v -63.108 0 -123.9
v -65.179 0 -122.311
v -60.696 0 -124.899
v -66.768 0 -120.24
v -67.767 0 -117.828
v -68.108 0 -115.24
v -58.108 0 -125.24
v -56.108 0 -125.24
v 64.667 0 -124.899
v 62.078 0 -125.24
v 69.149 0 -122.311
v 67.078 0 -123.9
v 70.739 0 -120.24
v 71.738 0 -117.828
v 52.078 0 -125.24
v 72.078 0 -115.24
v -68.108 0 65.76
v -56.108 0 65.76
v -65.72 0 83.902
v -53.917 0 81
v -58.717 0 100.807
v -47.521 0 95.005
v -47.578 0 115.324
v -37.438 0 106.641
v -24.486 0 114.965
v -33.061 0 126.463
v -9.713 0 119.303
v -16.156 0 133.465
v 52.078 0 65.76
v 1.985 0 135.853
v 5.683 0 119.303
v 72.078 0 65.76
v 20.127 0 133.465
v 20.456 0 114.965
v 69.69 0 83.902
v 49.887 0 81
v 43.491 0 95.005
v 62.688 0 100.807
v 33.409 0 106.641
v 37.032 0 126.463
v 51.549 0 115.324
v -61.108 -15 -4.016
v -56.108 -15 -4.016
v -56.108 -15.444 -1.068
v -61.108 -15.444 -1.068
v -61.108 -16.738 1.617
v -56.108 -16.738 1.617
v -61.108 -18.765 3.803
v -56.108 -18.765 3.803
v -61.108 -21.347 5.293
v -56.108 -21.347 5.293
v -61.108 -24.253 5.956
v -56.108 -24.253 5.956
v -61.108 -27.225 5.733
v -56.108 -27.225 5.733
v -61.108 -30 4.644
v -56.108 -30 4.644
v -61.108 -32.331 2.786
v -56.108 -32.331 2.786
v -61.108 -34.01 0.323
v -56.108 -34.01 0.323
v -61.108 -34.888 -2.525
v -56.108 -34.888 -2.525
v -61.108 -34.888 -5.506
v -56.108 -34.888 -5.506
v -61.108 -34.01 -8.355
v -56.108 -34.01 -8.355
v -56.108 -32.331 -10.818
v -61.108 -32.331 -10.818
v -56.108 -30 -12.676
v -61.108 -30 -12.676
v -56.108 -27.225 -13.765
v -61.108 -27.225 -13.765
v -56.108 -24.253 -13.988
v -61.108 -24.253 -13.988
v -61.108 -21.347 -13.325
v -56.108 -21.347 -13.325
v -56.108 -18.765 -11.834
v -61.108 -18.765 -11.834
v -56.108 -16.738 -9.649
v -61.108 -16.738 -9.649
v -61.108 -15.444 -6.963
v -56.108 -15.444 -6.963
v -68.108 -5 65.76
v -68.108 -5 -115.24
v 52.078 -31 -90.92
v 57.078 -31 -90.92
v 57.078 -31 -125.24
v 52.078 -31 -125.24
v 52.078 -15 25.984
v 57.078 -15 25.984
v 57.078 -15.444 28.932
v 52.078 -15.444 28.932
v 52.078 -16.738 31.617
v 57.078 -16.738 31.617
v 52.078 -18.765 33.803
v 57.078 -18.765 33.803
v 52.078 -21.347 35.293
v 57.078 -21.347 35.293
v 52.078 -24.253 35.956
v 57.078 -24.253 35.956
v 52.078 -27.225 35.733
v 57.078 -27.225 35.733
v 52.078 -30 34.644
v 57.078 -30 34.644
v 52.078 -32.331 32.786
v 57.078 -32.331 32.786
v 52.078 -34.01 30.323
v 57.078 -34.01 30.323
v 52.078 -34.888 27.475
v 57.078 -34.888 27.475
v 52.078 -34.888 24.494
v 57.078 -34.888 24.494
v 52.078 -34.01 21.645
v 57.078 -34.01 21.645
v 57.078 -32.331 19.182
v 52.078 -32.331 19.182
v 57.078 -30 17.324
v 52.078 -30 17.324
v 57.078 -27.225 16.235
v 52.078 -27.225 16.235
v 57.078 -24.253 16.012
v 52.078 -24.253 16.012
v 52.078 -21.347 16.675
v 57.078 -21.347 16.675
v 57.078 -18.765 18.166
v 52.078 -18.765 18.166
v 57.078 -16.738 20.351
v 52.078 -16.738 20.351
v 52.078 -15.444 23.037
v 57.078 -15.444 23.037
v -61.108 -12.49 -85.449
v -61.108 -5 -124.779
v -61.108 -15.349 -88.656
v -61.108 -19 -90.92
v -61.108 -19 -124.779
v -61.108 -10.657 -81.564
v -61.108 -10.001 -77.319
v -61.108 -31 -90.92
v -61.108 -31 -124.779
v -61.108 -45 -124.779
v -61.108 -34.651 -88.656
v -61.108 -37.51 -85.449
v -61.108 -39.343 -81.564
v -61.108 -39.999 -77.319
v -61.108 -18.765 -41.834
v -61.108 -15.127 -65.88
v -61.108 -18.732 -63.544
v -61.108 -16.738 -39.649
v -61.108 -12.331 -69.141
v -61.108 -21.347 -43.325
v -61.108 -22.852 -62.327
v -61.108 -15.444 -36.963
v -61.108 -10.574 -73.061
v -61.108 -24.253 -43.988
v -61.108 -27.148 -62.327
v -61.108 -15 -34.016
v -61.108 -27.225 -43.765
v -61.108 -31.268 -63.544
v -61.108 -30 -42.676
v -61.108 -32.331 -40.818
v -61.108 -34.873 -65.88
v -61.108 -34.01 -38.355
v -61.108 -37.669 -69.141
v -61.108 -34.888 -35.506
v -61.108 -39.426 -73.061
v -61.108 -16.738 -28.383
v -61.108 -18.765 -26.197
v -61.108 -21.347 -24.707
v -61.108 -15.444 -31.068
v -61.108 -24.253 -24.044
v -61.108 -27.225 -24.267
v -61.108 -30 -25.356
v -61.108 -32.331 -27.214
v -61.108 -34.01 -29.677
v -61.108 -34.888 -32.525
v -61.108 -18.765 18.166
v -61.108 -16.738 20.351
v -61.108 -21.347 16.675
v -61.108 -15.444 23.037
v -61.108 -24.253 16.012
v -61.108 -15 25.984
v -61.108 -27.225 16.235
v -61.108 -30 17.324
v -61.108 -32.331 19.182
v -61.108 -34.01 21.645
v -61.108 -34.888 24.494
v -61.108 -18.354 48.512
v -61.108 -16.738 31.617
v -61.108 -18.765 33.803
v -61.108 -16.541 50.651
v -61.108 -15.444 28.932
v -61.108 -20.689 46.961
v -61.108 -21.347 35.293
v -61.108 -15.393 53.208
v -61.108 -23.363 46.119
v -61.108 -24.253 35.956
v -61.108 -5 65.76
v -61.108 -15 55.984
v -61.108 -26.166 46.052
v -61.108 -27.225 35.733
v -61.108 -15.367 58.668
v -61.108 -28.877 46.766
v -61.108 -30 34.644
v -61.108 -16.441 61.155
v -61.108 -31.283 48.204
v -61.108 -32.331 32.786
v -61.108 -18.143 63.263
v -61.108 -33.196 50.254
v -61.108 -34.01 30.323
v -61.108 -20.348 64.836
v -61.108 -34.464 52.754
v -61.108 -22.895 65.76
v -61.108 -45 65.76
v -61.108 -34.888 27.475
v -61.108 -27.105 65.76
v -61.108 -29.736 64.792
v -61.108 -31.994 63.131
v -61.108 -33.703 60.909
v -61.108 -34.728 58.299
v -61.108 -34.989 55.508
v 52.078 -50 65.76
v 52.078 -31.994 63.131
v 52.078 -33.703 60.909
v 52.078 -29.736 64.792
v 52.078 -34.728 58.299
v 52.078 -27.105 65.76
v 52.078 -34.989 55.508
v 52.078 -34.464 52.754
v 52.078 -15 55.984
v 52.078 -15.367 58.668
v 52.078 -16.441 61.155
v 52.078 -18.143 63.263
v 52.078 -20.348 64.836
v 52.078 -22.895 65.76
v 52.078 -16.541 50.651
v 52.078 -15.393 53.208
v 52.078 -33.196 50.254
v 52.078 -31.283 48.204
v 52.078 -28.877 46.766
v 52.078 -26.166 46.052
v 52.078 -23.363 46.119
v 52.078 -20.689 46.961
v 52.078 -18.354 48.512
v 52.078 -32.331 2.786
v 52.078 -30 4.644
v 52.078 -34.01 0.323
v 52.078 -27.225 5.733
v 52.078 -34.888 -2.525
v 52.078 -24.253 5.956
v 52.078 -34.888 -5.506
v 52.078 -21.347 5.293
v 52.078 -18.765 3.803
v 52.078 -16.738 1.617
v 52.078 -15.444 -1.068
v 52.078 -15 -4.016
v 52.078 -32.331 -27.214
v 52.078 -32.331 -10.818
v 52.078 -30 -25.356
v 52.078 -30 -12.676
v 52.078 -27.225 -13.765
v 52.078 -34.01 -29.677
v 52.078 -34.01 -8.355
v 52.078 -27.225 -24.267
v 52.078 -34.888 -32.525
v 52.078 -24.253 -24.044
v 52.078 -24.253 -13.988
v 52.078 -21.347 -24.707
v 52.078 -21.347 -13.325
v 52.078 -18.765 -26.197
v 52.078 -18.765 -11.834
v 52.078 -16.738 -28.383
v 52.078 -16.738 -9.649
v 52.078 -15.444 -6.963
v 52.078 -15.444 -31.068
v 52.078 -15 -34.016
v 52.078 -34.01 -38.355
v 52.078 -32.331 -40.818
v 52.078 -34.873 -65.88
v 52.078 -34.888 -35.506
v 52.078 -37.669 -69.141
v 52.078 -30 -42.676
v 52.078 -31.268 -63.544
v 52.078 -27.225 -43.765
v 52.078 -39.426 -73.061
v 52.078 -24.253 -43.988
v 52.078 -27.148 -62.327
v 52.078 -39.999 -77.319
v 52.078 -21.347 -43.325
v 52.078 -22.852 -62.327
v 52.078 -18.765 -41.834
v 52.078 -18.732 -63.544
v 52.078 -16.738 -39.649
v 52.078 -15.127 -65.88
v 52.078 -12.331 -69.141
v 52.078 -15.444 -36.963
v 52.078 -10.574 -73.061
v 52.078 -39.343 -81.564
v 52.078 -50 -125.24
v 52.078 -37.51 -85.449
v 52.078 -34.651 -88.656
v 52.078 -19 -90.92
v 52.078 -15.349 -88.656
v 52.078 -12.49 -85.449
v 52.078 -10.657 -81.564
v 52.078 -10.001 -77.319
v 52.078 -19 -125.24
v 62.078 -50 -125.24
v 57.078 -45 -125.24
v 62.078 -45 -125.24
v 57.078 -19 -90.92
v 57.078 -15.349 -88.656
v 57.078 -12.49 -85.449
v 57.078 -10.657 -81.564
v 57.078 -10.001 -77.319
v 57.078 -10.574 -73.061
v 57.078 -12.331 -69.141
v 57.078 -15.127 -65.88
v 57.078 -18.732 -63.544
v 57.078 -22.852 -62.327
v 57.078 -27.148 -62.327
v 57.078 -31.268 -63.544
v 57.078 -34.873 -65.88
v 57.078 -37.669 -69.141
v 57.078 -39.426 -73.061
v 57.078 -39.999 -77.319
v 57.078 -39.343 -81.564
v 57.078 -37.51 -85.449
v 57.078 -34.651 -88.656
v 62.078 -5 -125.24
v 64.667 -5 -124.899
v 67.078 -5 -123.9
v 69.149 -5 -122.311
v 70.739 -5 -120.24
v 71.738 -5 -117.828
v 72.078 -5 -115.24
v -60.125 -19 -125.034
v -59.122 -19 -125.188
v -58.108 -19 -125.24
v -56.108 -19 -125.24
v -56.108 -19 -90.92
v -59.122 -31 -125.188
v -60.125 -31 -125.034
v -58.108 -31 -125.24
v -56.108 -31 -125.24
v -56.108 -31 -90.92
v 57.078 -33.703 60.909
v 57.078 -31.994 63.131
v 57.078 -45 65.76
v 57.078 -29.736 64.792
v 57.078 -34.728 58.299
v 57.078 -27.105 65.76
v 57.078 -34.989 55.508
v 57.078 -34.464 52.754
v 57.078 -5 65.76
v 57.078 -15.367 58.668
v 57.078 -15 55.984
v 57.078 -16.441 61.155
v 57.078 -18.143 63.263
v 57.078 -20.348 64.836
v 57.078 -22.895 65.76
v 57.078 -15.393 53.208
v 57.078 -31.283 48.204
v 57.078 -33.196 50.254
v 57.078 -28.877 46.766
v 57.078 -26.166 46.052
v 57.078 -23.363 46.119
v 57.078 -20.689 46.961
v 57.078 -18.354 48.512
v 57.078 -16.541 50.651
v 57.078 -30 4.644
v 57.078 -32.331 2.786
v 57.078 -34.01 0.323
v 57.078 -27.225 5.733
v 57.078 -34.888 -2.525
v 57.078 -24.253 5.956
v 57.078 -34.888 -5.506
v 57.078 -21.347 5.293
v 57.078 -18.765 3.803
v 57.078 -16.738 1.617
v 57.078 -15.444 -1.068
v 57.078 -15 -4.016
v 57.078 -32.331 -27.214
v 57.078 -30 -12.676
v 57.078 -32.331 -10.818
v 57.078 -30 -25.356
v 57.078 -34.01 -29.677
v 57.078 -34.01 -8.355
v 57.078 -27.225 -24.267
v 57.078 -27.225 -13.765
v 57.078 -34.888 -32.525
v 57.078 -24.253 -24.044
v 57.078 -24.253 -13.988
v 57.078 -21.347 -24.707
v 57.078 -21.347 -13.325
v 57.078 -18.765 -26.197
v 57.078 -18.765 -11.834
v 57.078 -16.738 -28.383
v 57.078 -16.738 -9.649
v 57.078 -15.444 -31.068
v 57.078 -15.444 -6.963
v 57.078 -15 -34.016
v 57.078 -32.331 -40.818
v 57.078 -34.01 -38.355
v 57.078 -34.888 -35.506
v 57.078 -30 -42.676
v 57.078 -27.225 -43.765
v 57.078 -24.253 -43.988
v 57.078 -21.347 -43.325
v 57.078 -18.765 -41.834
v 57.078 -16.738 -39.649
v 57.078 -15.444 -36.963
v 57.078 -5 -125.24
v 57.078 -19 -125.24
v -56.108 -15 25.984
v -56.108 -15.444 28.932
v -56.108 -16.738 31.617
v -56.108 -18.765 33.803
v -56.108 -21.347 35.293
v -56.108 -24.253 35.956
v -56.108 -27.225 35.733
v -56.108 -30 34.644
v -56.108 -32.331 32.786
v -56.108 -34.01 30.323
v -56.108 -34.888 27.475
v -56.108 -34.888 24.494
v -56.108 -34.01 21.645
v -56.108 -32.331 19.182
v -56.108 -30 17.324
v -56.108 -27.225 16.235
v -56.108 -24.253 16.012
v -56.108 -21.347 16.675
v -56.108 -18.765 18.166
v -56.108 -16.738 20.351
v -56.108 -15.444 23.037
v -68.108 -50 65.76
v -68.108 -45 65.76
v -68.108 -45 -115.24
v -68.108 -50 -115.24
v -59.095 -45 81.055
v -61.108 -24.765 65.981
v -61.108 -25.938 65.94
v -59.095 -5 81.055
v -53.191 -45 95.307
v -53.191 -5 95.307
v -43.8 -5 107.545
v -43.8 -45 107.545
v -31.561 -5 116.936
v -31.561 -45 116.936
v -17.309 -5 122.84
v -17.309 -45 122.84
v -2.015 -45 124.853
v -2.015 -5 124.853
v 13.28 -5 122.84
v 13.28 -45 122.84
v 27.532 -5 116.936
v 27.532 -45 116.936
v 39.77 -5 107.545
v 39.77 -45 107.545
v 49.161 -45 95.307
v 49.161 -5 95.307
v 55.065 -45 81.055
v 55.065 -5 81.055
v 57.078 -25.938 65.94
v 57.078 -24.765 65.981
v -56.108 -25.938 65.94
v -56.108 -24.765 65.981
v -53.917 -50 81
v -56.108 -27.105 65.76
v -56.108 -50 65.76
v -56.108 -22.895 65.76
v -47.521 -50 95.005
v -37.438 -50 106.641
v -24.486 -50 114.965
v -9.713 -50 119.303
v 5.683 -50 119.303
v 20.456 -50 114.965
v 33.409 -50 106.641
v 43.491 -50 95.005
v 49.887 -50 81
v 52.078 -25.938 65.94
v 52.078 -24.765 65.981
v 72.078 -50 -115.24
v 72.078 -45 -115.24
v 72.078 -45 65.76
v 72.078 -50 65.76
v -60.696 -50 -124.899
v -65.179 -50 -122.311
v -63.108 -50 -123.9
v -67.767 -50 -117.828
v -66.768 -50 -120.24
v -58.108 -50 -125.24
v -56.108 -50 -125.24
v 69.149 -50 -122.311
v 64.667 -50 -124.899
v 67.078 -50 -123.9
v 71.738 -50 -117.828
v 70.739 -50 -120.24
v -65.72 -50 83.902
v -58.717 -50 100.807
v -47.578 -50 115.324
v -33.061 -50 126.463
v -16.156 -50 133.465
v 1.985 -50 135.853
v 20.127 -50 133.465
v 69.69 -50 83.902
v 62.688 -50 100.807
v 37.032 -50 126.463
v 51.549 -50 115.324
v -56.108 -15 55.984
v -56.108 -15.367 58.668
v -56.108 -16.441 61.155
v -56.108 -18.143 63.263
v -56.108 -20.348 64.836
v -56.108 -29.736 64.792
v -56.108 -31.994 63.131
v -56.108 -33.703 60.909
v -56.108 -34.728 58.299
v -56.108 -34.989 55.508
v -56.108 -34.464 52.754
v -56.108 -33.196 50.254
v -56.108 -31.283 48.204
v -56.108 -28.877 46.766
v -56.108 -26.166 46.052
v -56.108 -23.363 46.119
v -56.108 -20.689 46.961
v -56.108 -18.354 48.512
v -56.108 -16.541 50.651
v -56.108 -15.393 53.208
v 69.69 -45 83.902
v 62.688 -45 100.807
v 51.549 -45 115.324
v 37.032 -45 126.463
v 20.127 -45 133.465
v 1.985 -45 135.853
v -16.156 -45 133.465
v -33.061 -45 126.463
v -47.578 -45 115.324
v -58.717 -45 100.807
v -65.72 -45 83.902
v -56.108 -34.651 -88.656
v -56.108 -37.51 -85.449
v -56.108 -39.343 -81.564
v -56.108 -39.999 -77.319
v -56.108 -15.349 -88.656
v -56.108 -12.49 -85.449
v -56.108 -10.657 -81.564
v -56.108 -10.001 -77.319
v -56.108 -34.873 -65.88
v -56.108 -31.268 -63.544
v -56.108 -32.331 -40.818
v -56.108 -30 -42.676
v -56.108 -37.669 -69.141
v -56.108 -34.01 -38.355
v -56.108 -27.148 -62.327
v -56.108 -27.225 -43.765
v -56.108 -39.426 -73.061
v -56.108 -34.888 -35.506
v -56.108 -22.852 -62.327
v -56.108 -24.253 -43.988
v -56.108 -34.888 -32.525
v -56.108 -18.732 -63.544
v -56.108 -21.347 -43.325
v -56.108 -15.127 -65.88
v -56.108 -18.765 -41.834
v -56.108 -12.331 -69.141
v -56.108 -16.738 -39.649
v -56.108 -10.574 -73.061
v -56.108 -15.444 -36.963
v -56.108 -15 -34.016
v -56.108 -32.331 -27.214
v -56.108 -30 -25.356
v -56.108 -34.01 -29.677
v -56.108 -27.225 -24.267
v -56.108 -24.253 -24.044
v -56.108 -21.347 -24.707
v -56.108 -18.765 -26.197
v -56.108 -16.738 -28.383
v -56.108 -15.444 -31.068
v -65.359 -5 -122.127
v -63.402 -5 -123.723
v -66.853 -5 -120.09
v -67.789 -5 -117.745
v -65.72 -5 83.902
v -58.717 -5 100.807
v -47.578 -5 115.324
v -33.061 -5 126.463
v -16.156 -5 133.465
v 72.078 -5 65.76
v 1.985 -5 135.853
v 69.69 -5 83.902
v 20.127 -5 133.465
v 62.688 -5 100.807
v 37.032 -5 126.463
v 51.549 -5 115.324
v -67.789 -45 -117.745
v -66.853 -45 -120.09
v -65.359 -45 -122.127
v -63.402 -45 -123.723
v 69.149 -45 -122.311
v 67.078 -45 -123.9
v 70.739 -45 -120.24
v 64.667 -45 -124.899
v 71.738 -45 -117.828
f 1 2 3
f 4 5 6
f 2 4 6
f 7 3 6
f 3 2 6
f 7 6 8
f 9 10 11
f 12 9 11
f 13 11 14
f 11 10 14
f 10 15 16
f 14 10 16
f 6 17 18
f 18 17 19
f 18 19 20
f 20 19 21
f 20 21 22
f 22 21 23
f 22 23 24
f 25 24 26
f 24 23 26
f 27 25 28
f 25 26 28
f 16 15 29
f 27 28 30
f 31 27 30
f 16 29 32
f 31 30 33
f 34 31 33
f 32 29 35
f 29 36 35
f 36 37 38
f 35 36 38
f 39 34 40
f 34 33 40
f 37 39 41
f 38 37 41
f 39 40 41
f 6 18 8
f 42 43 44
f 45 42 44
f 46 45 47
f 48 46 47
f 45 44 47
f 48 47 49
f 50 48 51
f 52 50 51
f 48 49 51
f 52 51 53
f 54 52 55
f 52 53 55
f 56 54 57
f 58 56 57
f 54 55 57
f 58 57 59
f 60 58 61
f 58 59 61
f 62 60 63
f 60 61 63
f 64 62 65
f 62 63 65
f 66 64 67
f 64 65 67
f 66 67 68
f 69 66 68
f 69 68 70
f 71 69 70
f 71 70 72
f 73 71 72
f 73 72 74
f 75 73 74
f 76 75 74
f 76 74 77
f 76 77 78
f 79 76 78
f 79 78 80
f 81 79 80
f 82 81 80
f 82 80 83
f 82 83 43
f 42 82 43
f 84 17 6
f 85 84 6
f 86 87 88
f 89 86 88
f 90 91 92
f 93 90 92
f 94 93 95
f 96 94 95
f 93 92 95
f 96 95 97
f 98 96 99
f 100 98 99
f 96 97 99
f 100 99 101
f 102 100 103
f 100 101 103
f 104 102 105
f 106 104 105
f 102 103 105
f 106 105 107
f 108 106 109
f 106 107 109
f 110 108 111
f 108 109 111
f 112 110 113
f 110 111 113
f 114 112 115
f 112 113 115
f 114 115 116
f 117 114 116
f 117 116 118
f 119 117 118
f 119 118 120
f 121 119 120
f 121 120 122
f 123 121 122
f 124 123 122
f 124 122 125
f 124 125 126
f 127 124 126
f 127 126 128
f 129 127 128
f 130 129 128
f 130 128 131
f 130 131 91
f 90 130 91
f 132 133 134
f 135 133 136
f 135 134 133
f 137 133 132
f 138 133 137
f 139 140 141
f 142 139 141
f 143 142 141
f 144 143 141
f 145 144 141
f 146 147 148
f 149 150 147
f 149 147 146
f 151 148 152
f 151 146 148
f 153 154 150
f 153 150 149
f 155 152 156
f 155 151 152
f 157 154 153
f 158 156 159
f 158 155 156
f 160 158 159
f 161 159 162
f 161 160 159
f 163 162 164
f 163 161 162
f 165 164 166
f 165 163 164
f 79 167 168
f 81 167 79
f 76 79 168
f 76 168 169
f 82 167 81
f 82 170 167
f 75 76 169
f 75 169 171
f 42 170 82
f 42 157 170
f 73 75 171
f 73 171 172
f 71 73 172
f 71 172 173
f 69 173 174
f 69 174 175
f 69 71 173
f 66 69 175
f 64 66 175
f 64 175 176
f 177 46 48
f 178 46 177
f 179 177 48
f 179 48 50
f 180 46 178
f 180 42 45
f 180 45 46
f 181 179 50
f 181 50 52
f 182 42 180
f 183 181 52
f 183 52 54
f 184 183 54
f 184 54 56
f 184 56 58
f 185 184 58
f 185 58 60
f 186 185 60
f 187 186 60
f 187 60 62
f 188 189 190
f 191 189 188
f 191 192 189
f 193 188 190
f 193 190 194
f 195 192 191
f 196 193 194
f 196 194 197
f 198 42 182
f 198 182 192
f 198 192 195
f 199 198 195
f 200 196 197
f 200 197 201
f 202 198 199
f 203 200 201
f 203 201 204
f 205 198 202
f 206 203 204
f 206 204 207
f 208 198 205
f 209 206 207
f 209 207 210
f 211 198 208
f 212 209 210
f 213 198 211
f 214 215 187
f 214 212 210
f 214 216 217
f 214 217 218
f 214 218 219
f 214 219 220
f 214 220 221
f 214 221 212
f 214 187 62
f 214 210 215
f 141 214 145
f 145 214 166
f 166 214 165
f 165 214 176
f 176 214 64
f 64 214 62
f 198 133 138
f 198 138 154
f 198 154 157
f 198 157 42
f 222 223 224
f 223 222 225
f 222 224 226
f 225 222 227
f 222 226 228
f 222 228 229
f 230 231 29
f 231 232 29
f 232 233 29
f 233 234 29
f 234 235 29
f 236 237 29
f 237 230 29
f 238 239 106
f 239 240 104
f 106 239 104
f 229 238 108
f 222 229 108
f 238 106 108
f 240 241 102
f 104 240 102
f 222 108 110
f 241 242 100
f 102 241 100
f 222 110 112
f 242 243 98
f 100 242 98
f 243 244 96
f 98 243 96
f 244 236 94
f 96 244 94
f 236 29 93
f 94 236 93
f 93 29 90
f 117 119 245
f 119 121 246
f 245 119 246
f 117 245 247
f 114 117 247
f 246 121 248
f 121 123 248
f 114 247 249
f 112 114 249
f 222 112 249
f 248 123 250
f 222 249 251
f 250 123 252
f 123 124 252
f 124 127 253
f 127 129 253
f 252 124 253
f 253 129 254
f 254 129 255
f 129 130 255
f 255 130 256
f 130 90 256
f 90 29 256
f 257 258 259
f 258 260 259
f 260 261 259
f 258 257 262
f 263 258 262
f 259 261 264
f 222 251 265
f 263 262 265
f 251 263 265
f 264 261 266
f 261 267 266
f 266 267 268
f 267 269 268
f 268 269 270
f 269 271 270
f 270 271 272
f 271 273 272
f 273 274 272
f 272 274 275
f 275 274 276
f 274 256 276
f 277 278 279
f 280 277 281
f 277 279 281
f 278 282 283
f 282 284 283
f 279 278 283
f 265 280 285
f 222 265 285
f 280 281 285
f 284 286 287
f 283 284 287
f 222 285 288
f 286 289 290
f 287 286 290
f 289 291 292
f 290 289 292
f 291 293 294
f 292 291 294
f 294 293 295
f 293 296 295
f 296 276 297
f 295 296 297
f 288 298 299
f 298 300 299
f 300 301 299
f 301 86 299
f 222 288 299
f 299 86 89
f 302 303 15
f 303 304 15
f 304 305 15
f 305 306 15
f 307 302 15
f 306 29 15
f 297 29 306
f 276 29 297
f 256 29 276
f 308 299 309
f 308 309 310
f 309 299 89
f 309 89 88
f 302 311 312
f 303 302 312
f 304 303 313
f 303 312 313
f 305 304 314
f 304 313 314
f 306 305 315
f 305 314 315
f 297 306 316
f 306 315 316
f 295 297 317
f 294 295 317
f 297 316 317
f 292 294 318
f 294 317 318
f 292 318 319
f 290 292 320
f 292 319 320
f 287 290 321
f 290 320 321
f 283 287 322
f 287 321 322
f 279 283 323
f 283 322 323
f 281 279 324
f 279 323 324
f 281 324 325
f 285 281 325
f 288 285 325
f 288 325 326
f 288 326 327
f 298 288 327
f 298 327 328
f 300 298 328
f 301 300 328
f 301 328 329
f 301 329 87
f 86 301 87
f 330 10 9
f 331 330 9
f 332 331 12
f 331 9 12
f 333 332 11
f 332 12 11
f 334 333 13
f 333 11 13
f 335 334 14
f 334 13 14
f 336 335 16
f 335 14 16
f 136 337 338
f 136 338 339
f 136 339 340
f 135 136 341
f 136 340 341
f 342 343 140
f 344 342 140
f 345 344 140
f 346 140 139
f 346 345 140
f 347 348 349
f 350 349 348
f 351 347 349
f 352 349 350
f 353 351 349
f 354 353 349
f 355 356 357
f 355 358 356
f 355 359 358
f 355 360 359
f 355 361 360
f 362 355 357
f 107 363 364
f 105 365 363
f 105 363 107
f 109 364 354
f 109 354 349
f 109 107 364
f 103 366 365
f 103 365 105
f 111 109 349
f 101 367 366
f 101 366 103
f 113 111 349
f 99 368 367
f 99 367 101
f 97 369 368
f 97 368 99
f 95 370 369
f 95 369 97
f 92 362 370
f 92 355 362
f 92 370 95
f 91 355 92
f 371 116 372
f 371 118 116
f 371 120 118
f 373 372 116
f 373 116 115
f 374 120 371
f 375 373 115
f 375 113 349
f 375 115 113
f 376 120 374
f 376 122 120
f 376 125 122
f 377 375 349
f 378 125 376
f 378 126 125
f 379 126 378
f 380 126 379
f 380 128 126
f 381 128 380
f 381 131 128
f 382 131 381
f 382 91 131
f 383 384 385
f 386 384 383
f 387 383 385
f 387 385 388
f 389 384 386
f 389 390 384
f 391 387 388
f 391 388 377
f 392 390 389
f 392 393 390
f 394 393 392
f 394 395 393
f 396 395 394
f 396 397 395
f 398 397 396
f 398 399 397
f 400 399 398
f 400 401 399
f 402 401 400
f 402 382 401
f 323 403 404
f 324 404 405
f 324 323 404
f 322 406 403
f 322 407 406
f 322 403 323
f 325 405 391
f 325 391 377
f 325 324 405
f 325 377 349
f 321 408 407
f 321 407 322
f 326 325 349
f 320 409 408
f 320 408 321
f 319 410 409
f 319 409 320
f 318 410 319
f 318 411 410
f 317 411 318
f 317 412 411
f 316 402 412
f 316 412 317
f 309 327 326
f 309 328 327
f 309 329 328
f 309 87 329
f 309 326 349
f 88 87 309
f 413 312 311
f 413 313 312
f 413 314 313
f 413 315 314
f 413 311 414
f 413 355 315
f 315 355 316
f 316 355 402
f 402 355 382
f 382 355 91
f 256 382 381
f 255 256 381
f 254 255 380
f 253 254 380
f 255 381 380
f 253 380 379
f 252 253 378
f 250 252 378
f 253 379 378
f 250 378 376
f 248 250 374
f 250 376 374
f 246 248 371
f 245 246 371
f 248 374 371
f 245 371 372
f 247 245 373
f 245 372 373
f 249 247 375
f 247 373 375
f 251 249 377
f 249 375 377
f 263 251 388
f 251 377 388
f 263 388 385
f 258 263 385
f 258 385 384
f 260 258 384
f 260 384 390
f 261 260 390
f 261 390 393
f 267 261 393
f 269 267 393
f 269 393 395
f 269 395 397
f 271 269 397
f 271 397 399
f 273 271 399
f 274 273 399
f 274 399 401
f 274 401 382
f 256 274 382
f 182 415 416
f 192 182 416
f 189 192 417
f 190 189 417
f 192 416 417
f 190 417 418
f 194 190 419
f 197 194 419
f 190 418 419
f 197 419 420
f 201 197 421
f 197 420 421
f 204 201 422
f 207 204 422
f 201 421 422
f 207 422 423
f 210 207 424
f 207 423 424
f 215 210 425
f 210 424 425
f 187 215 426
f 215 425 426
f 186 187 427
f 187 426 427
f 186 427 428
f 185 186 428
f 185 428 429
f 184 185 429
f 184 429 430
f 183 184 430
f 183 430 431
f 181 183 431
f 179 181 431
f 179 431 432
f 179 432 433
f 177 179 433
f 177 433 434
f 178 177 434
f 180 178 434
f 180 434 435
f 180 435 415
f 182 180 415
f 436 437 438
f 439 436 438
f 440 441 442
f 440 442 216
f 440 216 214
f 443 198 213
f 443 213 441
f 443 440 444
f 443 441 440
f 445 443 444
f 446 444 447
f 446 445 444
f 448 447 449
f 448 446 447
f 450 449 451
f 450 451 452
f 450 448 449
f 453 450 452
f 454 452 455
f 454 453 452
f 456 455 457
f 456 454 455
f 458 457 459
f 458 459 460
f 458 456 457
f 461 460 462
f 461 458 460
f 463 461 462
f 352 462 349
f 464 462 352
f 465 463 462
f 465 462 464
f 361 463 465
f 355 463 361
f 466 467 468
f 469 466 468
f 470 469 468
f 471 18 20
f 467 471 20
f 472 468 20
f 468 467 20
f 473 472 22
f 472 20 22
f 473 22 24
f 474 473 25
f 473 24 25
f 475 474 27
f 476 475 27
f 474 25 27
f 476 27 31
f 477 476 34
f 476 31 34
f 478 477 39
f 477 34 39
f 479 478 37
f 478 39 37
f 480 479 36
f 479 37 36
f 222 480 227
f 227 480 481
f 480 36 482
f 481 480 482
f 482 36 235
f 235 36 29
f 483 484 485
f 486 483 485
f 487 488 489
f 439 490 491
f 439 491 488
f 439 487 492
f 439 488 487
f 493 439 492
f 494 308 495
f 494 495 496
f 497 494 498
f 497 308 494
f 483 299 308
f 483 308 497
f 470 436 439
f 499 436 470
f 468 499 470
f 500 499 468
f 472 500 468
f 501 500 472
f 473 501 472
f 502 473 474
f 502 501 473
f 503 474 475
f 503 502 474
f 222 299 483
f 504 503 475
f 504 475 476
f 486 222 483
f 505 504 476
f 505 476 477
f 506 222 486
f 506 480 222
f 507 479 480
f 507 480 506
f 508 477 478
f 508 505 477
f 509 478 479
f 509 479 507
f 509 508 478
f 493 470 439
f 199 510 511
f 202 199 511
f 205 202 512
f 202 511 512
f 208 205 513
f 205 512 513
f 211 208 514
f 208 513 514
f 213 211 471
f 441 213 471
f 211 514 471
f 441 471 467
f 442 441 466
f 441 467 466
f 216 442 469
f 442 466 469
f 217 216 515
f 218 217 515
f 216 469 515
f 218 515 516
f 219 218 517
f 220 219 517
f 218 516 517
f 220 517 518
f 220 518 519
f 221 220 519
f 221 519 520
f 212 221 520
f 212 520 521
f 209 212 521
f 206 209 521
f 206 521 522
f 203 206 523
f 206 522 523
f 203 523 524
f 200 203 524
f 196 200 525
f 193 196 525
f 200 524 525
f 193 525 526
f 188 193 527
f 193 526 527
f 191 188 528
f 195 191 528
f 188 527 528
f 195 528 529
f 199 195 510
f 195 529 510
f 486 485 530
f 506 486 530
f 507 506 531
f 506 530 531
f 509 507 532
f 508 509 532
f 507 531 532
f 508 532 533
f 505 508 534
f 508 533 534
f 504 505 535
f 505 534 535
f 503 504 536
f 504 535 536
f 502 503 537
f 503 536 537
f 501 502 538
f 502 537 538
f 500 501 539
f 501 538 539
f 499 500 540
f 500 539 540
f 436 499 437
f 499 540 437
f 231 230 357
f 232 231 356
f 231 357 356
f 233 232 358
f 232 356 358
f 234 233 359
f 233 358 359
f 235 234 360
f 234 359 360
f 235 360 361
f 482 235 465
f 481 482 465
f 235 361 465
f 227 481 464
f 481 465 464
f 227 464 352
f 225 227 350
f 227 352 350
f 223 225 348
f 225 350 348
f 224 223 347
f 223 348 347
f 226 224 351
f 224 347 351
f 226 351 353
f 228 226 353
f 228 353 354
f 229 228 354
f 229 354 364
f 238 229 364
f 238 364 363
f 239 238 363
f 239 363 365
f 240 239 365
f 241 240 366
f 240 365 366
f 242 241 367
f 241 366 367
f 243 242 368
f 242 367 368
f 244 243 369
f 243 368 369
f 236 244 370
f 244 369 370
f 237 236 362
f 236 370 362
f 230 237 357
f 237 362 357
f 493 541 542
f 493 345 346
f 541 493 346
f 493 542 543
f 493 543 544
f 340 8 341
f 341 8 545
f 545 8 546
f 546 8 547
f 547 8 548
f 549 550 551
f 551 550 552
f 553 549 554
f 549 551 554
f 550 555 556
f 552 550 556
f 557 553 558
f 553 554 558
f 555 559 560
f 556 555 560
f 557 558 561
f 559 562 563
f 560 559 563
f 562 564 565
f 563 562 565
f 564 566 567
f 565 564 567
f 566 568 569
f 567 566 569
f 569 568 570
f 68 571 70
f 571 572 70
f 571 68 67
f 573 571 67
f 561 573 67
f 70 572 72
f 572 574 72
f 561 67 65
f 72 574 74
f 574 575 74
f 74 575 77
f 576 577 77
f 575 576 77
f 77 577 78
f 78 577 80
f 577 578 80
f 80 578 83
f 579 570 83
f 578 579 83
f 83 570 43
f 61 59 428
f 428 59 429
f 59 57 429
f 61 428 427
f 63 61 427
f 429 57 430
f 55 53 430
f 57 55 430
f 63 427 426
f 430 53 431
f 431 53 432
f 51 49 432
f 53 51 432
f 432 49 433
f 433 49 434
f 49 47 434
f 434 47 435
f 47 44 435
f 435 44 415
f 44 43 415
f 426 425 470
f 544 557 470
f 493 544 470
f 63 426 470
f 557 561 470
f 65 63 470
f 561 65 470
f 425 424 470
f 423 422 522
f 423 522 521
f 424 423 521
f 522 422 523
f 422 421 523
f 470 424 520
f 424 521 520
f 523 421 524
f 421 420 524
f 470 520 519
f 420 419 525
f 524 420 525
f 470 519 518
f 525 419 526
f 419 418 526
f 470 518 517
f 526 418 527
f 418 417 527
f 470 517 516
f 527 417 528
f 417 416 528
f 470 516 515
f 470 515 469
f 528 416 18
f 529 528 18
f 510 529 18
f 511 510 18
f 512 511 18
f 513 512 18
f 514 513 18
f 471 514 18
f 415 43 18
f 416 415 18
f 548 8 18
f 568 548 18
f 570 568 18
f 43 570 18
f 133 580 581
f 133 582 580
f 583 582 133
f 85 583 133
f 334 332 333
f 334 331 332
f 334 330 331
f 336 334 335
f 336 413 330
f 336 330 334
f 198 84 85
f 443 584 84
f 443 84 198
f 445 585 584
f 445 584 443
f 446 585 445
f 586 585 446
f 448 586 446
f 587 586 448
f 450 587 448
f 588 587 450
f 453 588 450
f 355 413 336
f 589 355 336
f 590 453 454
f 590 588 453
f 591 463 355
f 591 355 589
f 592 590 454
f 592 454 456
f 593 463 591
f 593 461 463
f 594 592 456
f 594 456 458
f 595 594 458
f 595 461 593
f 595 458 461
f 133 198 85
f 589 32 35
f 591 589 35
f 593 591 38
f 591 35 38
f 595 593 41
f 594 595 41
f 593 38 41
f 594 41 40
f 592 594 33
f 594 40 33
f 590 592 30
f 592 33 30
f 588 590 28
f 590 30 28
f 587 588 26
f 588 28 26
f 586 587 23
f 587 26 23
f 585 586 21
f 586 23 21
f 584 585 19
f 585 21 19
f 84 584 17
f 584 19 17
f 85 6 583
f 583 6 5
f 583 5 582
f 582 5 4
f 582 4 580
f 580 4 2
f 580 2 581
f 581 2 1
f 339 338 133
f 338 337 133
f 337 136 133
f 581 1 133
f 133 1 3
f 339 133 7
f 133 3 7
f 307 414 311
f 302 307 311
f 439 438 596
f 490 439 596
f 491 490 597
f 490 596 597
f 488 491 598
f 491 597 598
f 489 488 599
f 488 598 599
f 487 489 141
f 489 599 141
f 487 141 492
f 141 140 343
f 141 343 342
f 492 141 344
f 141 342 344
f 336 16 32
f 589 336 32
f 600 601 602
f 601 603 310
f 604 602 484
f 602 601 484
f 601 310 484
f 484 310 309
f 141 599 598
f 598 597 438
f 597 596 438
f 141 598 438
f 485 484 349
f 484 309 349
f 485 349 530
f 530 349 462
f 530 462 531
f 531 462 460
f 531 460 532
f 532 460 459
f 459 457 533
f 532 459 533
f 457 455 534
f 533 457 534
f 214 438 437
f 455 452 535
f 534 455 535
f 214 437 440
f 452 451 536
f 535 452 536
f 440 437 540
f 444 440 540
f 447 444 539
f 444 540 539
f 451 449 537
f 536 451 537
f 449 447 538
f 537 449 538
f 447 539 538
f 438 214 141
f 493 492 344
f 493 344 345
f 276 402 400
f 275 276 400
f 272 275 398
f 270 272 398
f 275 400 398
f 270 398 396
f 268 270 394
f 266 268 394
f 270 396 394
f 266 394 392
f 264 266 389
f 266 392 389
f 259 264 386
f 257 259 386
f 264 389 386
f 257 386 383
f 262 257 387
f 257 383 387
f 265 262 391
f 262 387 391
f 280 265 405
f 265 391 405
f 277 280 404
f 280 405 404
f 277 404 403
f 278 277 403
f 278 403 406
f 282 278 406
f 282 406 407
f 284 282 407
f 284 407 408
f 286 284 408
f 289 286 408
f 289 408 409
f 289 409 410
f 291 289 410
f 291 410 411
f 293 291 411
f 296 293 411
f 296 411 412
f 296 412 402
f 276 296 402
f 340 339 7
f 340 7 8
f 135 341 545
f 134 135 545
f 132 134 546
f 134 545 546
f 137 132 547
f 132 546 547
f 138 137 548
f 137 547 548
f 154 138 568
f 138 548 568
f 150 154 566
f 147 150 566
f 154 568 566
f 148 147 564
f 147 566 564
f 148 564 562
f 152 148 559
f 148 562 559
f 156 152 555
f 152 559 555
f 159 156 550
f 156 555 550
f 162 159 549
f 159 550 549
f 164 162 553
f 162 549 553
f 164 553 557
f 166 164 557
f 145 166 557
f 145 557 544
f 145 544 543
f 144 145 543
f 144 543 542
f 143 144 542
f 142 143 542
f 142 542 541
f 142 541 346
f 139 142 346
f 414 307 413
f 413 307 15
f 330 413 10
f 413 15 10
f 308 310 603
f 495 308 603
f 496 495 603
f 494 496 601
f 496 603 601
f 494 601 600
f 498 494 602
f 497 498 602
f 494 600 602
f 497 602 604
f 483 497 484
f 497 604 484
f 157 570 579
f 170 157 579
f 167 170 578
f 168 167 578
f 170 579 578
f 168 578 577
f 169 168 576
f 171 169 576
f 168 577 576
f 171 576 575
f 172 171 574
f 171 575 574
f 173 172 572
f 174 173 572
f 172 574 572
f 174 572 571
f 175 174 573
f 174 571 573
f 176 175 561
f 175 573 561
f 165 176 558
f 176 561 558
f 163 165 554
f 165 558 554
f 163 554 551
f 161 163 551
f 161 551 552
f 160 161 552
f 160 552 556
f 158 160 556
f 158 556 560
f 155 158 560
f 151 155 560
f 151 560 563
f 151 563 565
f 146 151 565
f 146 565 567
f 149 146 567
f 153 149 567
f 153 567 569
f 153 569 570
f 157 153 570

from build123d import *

# Parameters (mm, degrees)
F1_DEPTH  = 50
F2_T      = 5
F4_R      = 10
F5_DEPTH  = 125.1874270275
F6_DEPTH  = 125.1874270275
F7_W      = 40
F7_H      = 10
F8_DEPTH  = 15
F9_W      = 40
F9_H      = 10
F10_DEPTH = 7
F11_W     = 12
F11_H     = 5
F12_DEPTH = 125.1874270275


# Not quite as in the source:
# - a shell that OpenCascade refuses in one call is made with other operations: the cavity is built on its own and cut out
# - a feature names something its author has since deleted; it is built from what else it names


with BuildPart() as f1:
    # F0 (on Front) → F1 (new body)
    with BuildSketch(Plane.XZ):
        with BuildLine():
            Line((-68.1080648237, 65.760188823), (-68.1080648237, -115.239811177))
            ThreePointArc((-68.1080648237, -115.239811177), (-65.1791326356, -122.3108789889), (-58.1080648237, -125.239811177))
            Line((-58.1080648237, -125.239811177), (-56.1080648237, -125.239811177))
            Line((-56.1080648237, -125.239811177), (-56.1080648237, 65.760188823))
            ThreePointArc((-56.1080648237, 65.760188823), (-2.01485131, 119.8534023367), (52.0783622037, 65.760188823))
            Line((52.0783622037, 65.760188823), (52.0783622037, -125.239811177))
            Line((52.0783622037, -125.239811177), (62.0783622037, -125.239811177))
            ThreePointArc((62.0783622037, -125.239811177), (69.1494300156, -122.3108789889), (72.0783622037, -115.239811177))
            Line((72.0783622037, -115.239811177), (72.0783622037, 65.760188823))
            ThreePointArc((72.0783622037, 65.760188823), (1.98514869, 135.8534023367), (-68.1080648237, 65.760188823))
        make_face()
    extrude(amount=F1_DEPTH)

    # F2: shell of thickness 5, made by hand


with BuildPart() as f2_core1:
    # F2_t2: copy of F1
    add(f1.part)

    # the walls: a layer under each face that stays
    f2_faces = [f2_core1.faces().sort_by_distance(p)[0] for p in [
        (52.0783622037, -25, -29.739811177),
        (57.0783622037, -25, -125.239811177),
        (69.1494300156, -25, -122.3108789889),
        (-65.1791326356, -25, -122.3108789889),
        (-57.1080648237, -25, -125.239811177),
        (-56.1080648237, -25, -29.739811177),
        (-2.01485131, -25, 119.8534023367),
        (48.7139576992, 0, 92.3378667511),
        (48.7139576992, -50, 92.3378667511),
    ]]
    thicken(f2_faces, amount=-F2_T, mode=Mode.SUBTRACT)


with BuildPart() as f1_1:
    add(f1.part)

    # what is left inside the walls is the cavity
    f2_cavity = [f2_core1.part.solids().sort_by_distance(p)[0] for p in [
        (1.985149, -31.666667, 135.803402),
    ]]
    add(f2_cavity, mode=Mode.SUBTRACT)

    # F4 (on face) → F5 (cut, through all)
    with BuildSketch(Plane.YZ.offset(57.0783622037)):
        with Locations((-25, 55.9842178226)):
            Circle(F4_R)
        with Locations((-25, 25.9842178226)):
            Circle(F4_R)
        with Locations((-25, -4.0157821774)):
            Circle(F4_R)
        with Locations((-25, -34.0157821774)):
            Circle(F4_R)
    extrude(amount=-F5_DEPTH, mode=Mode.SUBTRACT)

    # F3 (on face) → F6 (cut, through all)
    with BuildSketch(Plane.YZ.offset(57.0783622037)):
        with BuildLine():
            Line((-19, -120.239811177), (-19, -90.9199170358))
            ThreePointArc((-19, -90.9199170358), (-25, -62.1721899509), (-31, -90.9199170358))
            Line((-31, -90.9199170358), (-31, -120.239811177))
            Line((-31, -120.239811177), (-19, -120.239811177))
        make_face()
    extrude(amount=-F6_DEPTH, mode=Mode.SUBTRACT)

    # F7 (on face) → F8 (cut)
    with BuildSketch(Plane.YZ.offset(72.0783622037)):
        with Locations((-25, -120.239811177)):
            Rectangle(F7_W, F7_H)
    extrude(amount=-F8_DEPTH, mode=Mode.SUBTRACT)

    # F9 (on face) → F10 (cut)
    with BuildSketch(Plane(origin=(-68.1080648237, 0, 0), x_dir=(0, -1, 0), z_dir=(-1, 0, 0))):
        with Locations((25, -120.239811177)):
            Rectangle(F9_W, F9_H)
    extrude(amount=-F10_DEPTH, mode=Mode.SUBTRACT)

    # F11 (on face) → F12 (cut, through all)
    with BuildSketch(Plane.YZ.offset(57.0783622037)):
        with Locations((-25, -122.739811177)):
            Rectangle(F11_W, F11_H)
    extrude(amount=-F12_DEPTH, mode=Mode.SUBTRACT)


solid = f1_1.part
